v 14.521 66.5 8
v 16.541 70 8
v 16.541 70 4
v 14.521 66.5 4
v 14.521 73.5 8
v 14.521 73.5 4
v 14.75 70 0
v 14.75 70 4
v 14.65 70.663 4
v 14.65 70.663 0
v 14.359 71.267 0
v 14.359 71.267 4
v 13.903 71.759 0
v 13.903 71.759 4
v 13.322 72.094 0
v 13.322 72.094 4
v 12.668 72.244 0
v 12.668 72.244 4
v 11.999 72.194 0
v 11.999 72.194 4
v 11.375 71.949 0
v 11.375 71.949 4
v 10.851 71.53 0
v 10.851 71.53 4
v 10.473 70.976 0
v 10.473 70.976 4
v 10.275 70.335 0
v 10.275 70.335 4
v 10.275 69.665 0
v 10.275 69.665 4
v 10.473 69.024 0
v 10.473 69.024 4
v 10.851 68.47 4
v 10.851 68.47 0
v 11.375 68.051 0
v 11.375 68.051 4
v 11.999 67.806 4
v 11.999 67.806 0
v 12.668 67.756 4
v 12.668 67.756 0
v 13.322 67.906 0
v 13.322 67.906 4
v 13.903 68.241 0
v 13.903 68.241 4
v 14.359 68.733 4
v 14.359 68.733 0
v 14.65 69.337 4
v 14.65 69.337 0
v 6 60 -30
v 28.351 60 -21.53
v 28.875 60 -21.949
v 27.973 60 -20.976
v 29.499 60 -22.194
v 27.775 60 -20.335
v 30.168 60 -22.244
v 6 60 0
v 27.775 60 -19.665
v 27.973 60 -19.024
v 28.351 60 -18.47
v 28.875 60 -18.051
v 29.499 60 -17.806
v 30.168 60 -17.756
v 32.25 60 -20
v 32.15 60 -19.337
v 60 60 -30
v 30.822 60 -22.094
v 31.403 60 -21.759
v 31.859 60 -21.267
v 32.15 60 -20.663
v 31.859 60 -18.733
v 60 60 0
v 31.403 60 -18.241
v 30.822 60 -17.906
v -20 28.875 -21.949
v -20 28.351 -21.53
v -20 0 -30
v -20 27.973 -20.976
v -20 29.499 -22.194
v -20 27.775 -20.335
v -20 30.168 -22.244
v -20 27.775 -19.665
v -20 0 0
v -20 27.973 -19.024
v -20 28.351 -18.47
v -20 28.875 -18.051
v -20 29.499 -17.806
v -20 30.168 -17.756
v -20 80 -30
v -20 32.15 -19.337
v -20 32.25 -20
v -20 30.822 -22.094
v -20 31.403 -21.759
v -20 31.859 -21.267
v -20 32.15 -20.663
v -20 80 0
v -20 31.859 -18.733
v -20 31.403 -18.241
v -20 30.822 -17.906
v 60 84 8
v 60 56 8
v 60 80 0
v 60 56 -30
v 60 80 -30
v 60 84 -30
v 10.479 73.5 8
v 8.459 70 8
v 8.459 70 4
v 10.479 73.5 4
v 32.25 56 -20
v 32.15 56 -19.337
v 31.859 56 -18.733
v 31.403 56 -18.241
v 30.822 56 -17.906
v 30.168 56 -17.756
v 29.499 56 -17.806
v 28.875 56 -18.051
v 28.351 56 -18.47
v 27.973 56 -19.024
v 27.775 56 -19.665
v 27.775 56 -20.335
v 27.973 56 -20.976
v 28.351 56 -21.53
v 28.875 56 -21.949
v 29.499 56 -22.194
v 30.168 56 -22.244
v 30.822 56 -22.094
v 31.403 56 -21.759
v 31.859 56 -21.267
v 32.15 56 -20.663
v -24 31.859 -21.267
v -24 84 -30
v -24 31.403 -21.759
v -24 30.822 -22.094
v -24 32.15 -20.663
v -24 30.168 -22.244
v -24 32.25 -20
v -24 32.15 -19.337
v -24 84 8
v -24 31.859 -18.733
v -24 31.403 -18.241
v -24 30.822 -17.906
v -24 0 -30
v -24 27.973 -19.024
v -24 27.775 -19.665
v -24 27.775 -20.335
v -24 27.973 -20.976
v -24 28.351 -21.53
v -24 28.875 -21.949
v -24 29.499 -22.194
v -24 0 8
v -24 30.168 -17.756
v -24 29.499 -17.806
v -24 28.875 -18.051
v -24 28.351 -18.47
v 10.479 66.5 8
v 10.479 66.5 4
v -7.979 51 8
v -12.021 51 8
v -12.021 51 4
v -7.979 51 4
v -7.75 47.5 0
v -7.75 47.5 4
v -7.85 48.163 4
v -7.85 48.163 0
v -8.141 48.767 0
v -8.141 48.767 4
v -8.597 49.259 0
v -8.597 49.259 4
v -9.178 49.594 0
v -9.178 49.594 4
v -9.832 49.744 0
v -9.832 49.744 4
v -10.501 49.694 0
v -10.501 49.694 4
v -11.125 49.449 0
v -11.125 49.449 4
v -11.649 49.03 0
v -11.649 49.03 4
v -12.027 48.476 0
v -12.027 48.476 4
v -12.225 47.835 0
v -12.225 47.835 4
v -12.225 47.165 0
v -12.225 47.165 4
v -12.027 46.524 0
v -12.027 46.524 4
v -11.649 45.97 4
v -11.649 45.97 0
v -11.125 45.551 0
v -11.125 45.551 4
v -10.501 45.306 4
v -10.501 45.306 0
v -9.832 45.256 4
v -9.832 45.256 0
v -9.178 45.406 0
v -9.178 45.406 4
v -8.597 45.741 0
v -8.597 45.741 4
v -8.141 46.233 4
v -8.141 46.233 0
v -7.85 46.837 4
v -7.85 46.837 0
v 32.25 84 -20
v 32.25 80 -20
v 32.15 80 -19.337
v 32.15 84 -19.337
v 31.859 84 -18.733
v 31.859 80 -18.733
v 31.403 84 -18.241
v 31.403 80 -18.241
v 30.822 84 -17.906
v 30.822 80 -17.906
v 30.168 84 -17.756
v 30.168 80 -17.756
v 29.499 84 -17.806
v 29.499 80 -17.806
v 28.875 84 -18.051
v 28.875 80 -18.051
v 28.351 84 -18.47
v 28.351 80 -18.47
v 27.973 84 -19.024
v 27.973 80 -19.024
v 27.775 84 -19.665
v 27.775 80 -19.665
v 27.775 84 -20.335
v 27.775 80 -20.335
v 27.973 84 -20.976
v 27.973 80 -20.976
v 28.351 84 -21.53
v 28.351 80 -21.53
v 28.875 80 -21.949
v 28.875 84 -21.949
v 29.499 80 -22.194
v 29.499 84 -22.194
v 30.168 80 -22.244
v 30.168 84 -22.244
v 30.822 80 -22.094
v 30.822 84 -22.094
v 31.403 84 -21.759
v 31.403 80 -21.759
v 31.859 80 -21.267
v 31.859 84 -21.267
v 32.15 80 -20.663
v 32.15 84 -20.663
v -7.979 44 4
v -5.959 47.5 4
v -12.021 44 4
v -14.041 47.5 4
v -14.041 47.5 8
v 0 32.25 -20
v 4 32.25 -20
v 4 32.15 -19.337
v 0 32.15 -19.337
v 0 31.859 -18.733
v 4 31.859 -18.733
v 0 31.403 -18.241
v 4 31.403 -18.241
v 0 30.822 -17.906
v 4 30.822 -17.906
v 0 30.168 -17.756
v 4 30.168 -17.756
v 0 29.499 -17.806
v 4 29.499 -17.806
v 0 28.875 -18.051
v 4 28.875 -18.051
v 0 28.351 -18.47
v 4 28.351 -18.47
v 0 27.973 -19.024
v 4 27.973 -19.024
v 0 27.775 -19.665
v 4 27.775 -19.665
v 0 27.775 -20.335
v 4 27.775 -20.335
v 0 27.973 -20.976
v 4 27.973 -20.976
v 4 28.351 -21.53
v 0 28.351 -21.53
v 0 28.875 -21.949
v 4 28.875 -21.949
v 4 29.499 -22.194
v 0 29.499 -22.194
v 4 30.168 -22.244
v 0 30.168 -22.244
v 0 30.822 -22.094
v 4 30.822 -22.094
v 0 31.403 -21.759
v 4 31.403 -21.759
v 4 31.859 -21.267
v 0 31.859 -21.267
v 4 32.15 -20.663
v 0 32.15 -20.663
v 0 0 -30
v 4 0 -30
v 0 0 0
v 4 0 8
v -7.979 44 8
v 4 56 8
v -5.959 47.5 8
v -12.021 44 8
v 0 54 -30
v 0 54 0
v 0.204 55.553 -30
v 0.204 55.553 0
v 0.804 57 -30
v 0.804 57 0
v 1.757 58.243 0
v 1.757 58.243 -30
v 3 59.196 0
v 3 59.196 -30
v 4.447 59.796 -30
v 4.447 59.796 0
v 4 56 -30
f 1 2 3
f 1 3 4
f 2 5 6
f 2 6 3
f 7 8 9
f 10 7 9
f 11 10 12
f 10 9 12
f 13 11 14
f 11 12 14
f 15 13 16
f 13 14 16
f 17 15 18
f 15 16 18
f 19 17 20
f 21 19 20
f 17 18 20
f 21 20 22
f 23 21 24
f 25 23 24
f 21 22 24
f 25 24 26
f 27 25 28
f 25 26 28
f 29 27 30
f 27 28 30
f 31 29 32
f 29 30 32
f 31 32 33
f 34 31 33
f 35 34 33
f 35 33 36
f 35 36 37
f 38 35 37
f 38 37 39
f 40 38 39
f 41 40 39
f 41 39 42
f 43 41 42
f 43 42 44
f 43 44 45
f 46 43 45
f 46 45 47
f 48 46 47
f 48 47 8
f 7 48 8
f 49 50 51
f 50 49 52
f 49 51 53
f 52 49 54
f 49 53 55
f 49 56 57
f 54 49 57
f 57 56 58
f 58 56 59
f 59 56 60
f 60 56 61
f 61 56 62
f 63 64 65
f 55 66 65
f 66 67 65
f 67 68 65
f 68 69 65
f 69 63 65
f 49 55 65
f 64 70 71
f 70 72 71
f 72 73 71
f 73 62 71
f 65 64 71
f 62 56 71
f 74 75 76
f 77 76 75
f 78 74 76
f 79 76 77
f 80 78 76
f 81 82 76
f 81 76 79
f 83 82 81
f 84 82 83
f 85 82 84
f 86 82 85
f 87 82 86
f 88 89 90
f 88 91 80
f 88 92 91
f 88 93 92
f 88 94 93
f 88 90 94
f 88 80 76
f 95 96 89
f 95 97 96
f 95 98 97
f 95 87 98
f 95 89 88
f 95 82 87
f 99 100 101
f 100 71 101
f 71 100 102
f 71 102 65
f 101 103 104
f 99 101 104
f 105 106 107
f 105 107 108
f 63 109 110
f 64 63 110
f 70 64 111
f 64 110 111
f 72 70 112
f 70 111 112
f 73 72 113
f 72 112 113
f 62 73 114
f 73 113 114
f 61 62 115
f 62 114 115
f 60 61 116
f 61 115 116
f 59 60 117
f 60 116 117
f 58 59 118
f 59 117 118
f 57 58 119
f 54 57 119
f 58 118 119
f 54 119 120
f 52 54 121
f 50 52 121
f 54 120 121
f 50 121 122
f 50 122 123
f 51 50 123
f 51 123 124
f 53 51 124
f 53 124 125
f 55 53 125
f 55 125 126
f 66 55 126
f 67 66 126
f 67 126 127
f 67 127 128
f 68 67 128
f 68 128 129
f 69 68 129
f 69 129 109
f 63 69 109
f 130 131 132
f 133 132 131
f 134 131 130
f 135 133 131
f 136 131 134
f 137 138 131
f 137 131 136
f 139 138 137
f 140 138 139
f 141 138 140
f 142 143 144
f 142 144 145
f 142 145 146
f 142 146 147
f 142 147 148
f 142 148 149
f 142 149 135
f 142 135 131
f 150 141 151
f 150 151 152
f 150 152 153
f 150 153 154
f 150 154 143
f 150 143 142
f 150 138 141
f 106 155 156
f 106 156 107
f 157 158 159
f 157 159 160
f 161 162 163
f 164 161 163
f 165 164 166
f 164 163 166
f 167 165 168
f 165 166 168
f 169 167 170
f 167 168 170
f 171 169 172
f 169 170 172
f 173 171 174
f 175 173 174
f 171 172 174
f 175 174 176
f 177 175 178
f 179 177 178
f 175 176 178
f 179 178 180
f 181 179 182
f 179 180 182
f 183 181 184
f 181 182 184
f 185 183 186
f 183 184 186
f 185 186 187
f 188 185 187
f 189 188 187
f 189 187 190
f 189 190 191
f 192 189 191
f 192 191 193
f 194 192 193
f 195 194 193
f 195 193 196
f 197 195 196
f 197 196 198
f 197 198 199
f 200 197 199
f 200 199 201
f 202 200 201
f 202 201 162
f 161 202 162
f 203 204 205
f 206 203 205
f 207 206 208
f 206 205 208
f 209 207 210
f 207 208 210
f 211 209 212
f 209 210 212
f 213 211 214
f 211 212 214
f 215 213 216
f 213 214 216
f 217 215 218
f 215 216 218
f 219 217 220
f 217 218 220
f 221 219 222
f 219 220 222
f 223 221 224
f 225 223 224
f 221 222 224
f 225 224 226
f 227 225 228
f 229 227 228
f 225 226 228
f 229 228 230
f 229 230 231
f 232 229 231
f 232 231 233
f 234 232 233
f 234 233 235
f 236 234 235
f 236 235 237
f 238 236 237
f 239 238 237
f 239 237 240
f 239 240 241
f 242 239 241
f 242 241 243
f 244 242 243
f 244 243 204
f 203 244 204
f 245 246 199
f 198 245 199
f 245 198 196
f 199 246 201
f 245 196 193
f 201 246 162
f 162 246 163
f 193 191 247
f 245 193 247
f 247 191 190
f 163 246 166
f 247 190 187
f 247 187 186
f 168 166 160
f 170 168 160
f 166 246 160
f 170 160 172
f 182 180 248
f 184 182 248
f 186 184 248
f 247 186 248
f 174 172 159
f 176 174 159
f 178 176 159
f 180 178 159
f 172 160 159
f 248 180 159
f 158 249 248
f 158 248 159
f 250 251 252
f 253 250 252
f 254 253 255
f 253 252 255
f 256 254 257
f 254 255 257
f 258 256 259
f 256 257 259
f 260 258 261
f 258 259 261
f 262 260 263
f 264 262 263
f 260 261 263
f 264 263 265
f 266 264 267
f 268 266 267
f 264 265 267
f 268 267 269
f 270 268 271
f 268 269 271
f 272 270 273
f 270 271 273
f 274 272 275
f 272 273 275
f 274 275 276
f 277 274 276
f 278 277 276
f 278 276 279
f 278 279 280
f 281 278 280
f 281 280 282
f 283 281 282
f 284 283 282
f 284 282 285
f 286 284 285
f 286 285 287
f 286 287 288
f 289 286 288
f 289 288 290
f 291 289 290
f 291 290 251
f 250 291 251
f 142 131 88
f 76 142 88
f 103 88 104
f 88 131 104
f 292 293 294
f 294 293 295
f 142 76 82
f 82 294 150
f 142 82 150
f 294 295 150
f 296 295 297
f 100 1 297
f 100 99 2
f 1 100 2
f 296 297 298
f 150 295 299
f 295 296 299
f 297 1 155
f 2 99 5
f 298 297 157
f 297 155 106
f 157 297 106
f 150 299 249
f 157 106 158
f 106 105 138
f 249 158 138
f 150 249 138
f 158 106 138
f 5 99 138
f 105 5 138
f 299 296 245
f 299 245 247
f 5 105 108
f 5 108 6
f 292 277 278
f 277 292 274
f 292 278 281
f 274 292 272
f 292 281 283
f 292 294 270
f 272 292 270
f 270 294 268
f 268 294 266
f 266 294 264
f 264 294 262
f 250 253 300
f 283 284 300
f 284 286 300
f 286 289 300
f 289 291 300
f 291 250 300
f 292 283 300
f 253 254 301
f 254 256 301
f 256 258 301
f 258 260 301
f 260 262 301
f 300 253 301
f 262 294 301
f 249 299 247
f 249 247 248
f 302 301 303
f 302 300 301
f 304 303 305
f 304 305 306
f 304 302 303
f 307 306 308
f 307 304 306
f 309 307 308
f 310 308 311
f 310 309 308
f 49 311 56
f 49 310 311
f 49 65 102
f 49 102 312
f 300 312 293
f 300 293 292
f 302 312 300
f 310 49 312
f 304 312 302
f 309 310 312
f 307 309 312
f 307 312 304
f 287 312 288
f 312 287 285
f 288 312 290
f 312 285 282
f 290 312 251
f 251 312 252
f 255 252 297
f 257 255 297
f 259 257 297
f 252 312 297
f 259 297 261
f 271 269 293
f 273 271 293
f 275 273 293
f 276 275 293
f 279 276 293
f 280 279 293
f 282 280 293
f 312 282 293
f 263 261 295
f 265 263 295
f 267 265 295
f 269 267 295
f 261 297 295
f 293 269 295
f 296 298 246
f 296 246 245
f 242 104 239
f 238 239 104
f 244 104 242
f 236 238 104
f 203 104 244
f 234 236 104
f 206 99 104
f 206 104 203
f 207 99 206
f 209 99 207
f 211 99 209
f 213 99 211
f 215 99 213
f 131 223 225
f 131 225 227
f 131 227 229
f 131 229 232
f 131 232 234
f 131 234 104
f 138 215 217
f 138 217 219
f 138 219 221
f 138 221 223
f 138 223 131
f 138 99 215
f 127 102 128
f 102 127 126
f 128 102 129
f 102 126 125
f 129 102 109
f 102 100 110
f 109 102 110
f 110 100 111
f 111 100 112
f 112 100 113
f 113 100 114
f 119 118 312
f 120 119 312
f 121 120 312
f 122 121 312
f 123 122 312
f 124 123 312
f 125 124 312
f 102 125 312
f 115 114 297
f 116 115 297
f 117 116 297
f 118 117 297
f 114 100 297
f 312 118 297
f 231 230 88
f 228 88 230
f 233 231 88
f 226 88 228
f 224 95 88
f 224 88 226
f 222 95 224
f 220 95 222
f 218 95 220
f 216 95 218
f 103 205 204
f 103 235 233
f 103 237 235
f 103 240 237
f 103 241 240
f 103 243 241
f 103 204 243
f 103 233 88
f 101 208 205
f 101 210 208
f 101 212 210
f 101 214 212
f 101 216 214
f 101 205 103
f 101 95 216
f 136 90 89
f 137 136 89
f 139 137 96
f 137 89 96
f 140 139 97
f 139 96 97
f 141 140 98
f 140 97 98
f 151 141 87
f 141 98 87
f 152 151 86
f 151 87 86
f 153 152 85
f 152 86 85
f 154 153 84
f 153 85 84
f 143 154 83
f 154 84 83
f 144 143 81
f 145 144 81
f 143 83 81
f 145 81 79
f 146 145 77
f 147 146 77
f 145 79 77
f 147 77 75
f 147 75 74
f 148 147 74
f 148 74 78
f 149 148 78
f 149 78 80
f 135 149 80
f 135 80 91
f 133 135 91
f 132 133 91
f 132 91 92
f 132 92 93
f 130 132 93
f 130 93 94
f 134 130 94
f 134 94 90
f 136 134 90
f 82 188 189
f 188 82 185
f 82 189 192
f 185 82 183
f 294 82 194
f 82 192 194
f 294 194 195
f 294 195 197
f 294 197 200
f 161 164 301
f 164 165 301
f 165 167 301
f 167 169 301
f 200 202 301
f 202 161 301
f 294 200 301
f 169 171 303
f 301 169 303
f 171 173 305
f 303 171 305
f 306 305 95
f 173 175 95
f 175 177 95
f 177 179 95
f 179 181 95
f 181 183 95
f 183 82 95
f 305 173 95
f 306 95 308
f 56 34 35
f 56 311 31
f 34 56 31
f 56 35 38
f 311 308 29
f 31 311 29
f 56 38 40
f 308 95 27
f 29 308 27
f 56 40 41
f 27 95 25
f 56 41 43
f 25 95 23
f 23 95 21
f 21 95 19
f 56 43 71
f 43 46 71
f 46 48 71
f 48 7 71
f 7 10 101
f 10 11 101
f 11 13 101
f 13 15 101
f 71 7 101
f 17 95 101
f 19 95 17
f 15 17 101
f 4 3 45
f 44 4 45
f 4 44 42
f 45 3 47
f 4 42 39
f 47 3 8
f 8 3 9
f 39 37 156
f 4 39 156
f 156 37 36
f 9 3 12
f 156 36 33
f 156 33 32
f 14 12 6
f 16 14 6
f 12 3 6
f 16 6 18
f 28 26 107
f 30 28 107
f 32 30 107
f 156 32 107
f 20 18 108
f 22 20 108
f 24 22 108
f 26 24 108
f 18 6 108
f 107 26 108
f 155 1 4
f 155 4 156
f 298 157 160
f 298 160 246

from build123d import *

# Parameters (mm, degrees)
BOSS_EXTRU_1_DEPTH      = 8
ENL_V_MAT_EXTRU_1_DEPTH = 4
ESQUISSE3_R             = 2.25
ENL_V_MAT_EXTRU_2_DEPTH = 5
BOSS_EXTRU_2_DEPTH      = 38
ESQUISSE5_R             = 2.25
ENL_V_MAT_EXTRU_3_DEPTH = 29
ESQUISSE6_R             = 2.25
ENL_V_MAT_EXTRU_4_DEPTH = 29
CONG_1_R                = 6


with BuildPart() as part:
    # Esquisse1 → Boss.-Extru.1 (new body)
    with BuildSketch(Plane.XY):
        Polygon((0, 0), (0, 60), (60, 60), (60, 80), (-20, 80), (-20, 0), align=None)
    extrude(amount=BOSS_EXTRU_1_DEPTH)

    # Esquisse2 → Enlèv. mat.-Extru.1 (cut)
    with BuildSketch(Plane.XY.offset(8)):
        Polygon((-14.041451884, 47.5), (-12.020725942, 51), (-7.979274058, 51), (-5.958548116, 47.5), (-7.979274058, 44), (-12.020725942, 44), align=None)
        Polygon((8.458548116, 70), (10.479274058, 73.5), (14.520725942, 73.5), (16.541451884, 70), (14.520725942, 66.5), (10.479274058, 66.5), align=None)
    extrude(amount=-ENL_V_MAT_EXTRU_1_DEPTH, mode=Mode.SUBTRACT)

    # Esquisse3 → Enlèv. mat.-Extru.2 (cut, through all)
    with BuildSketch(Plane.XY.offset(4)):
        with Locations((-10, 47.5)):
            Circle(ESQUISSE3_R)
        with Locations((12.5, 70)):
            Circle(ESQUISSE3_R)
    extrude(amount=-ENL_V_MAT_EXTRU_2_DEPTH, mode=Mode.SUBTRACT)

    # Esquisse4 → Boss.-Extru.2 (add)
    with BuildSketch(Plane.XY.offset(8)):
        Polygon((0, 0), (0, 60), (60, 60), (60, 56), (4, 56), (4, 0), align=None)
        Polygon((60, 80), (60, 84), (-24, 84), (-24, 0), (-20, 0), (-20, 80), align=None)
    extrude(amount=-BOSS_EXTRU_2_DEPTH)

    # Esquisse5 → Enlèv. mat.-Extru.3 (cut, through all)
    with BuildSketch(Plane.XZ.offset(-56)):
        with Locations((30, -20)):
            Circle(ESQUISSE5_R)
    extrude(amount=-ENL_V_MAT_EXTRU_3_DEPTH, mode=Mode.SUBTRACT)

    # Esquisse6 → Enlèv. mat.-Extru.4 (cut, through all)
    with BuildSketch(Plane(origin=(4, 0, 0), x_dir=(0, 0, -1), z_dir=(1, 0, 0))):
        with Locations(Location((20, 30, 0), (0, 0, 90))):  # turned: the seam where the file's is
            Circle(ESQUISSE6_R)
    extrude(amount=-ENL_V_MAT_EXTRU_4_DEPTH, mode=Mode.SUBTRACT)

    # Congé1
    cong_1_edges = [part.edges().sort_by_distance(p)[0] for p in [
        (0, 60, -15),
    ]]
    fillet(cong_1_edges, radius=CONG_1_R)


solid = part.part
